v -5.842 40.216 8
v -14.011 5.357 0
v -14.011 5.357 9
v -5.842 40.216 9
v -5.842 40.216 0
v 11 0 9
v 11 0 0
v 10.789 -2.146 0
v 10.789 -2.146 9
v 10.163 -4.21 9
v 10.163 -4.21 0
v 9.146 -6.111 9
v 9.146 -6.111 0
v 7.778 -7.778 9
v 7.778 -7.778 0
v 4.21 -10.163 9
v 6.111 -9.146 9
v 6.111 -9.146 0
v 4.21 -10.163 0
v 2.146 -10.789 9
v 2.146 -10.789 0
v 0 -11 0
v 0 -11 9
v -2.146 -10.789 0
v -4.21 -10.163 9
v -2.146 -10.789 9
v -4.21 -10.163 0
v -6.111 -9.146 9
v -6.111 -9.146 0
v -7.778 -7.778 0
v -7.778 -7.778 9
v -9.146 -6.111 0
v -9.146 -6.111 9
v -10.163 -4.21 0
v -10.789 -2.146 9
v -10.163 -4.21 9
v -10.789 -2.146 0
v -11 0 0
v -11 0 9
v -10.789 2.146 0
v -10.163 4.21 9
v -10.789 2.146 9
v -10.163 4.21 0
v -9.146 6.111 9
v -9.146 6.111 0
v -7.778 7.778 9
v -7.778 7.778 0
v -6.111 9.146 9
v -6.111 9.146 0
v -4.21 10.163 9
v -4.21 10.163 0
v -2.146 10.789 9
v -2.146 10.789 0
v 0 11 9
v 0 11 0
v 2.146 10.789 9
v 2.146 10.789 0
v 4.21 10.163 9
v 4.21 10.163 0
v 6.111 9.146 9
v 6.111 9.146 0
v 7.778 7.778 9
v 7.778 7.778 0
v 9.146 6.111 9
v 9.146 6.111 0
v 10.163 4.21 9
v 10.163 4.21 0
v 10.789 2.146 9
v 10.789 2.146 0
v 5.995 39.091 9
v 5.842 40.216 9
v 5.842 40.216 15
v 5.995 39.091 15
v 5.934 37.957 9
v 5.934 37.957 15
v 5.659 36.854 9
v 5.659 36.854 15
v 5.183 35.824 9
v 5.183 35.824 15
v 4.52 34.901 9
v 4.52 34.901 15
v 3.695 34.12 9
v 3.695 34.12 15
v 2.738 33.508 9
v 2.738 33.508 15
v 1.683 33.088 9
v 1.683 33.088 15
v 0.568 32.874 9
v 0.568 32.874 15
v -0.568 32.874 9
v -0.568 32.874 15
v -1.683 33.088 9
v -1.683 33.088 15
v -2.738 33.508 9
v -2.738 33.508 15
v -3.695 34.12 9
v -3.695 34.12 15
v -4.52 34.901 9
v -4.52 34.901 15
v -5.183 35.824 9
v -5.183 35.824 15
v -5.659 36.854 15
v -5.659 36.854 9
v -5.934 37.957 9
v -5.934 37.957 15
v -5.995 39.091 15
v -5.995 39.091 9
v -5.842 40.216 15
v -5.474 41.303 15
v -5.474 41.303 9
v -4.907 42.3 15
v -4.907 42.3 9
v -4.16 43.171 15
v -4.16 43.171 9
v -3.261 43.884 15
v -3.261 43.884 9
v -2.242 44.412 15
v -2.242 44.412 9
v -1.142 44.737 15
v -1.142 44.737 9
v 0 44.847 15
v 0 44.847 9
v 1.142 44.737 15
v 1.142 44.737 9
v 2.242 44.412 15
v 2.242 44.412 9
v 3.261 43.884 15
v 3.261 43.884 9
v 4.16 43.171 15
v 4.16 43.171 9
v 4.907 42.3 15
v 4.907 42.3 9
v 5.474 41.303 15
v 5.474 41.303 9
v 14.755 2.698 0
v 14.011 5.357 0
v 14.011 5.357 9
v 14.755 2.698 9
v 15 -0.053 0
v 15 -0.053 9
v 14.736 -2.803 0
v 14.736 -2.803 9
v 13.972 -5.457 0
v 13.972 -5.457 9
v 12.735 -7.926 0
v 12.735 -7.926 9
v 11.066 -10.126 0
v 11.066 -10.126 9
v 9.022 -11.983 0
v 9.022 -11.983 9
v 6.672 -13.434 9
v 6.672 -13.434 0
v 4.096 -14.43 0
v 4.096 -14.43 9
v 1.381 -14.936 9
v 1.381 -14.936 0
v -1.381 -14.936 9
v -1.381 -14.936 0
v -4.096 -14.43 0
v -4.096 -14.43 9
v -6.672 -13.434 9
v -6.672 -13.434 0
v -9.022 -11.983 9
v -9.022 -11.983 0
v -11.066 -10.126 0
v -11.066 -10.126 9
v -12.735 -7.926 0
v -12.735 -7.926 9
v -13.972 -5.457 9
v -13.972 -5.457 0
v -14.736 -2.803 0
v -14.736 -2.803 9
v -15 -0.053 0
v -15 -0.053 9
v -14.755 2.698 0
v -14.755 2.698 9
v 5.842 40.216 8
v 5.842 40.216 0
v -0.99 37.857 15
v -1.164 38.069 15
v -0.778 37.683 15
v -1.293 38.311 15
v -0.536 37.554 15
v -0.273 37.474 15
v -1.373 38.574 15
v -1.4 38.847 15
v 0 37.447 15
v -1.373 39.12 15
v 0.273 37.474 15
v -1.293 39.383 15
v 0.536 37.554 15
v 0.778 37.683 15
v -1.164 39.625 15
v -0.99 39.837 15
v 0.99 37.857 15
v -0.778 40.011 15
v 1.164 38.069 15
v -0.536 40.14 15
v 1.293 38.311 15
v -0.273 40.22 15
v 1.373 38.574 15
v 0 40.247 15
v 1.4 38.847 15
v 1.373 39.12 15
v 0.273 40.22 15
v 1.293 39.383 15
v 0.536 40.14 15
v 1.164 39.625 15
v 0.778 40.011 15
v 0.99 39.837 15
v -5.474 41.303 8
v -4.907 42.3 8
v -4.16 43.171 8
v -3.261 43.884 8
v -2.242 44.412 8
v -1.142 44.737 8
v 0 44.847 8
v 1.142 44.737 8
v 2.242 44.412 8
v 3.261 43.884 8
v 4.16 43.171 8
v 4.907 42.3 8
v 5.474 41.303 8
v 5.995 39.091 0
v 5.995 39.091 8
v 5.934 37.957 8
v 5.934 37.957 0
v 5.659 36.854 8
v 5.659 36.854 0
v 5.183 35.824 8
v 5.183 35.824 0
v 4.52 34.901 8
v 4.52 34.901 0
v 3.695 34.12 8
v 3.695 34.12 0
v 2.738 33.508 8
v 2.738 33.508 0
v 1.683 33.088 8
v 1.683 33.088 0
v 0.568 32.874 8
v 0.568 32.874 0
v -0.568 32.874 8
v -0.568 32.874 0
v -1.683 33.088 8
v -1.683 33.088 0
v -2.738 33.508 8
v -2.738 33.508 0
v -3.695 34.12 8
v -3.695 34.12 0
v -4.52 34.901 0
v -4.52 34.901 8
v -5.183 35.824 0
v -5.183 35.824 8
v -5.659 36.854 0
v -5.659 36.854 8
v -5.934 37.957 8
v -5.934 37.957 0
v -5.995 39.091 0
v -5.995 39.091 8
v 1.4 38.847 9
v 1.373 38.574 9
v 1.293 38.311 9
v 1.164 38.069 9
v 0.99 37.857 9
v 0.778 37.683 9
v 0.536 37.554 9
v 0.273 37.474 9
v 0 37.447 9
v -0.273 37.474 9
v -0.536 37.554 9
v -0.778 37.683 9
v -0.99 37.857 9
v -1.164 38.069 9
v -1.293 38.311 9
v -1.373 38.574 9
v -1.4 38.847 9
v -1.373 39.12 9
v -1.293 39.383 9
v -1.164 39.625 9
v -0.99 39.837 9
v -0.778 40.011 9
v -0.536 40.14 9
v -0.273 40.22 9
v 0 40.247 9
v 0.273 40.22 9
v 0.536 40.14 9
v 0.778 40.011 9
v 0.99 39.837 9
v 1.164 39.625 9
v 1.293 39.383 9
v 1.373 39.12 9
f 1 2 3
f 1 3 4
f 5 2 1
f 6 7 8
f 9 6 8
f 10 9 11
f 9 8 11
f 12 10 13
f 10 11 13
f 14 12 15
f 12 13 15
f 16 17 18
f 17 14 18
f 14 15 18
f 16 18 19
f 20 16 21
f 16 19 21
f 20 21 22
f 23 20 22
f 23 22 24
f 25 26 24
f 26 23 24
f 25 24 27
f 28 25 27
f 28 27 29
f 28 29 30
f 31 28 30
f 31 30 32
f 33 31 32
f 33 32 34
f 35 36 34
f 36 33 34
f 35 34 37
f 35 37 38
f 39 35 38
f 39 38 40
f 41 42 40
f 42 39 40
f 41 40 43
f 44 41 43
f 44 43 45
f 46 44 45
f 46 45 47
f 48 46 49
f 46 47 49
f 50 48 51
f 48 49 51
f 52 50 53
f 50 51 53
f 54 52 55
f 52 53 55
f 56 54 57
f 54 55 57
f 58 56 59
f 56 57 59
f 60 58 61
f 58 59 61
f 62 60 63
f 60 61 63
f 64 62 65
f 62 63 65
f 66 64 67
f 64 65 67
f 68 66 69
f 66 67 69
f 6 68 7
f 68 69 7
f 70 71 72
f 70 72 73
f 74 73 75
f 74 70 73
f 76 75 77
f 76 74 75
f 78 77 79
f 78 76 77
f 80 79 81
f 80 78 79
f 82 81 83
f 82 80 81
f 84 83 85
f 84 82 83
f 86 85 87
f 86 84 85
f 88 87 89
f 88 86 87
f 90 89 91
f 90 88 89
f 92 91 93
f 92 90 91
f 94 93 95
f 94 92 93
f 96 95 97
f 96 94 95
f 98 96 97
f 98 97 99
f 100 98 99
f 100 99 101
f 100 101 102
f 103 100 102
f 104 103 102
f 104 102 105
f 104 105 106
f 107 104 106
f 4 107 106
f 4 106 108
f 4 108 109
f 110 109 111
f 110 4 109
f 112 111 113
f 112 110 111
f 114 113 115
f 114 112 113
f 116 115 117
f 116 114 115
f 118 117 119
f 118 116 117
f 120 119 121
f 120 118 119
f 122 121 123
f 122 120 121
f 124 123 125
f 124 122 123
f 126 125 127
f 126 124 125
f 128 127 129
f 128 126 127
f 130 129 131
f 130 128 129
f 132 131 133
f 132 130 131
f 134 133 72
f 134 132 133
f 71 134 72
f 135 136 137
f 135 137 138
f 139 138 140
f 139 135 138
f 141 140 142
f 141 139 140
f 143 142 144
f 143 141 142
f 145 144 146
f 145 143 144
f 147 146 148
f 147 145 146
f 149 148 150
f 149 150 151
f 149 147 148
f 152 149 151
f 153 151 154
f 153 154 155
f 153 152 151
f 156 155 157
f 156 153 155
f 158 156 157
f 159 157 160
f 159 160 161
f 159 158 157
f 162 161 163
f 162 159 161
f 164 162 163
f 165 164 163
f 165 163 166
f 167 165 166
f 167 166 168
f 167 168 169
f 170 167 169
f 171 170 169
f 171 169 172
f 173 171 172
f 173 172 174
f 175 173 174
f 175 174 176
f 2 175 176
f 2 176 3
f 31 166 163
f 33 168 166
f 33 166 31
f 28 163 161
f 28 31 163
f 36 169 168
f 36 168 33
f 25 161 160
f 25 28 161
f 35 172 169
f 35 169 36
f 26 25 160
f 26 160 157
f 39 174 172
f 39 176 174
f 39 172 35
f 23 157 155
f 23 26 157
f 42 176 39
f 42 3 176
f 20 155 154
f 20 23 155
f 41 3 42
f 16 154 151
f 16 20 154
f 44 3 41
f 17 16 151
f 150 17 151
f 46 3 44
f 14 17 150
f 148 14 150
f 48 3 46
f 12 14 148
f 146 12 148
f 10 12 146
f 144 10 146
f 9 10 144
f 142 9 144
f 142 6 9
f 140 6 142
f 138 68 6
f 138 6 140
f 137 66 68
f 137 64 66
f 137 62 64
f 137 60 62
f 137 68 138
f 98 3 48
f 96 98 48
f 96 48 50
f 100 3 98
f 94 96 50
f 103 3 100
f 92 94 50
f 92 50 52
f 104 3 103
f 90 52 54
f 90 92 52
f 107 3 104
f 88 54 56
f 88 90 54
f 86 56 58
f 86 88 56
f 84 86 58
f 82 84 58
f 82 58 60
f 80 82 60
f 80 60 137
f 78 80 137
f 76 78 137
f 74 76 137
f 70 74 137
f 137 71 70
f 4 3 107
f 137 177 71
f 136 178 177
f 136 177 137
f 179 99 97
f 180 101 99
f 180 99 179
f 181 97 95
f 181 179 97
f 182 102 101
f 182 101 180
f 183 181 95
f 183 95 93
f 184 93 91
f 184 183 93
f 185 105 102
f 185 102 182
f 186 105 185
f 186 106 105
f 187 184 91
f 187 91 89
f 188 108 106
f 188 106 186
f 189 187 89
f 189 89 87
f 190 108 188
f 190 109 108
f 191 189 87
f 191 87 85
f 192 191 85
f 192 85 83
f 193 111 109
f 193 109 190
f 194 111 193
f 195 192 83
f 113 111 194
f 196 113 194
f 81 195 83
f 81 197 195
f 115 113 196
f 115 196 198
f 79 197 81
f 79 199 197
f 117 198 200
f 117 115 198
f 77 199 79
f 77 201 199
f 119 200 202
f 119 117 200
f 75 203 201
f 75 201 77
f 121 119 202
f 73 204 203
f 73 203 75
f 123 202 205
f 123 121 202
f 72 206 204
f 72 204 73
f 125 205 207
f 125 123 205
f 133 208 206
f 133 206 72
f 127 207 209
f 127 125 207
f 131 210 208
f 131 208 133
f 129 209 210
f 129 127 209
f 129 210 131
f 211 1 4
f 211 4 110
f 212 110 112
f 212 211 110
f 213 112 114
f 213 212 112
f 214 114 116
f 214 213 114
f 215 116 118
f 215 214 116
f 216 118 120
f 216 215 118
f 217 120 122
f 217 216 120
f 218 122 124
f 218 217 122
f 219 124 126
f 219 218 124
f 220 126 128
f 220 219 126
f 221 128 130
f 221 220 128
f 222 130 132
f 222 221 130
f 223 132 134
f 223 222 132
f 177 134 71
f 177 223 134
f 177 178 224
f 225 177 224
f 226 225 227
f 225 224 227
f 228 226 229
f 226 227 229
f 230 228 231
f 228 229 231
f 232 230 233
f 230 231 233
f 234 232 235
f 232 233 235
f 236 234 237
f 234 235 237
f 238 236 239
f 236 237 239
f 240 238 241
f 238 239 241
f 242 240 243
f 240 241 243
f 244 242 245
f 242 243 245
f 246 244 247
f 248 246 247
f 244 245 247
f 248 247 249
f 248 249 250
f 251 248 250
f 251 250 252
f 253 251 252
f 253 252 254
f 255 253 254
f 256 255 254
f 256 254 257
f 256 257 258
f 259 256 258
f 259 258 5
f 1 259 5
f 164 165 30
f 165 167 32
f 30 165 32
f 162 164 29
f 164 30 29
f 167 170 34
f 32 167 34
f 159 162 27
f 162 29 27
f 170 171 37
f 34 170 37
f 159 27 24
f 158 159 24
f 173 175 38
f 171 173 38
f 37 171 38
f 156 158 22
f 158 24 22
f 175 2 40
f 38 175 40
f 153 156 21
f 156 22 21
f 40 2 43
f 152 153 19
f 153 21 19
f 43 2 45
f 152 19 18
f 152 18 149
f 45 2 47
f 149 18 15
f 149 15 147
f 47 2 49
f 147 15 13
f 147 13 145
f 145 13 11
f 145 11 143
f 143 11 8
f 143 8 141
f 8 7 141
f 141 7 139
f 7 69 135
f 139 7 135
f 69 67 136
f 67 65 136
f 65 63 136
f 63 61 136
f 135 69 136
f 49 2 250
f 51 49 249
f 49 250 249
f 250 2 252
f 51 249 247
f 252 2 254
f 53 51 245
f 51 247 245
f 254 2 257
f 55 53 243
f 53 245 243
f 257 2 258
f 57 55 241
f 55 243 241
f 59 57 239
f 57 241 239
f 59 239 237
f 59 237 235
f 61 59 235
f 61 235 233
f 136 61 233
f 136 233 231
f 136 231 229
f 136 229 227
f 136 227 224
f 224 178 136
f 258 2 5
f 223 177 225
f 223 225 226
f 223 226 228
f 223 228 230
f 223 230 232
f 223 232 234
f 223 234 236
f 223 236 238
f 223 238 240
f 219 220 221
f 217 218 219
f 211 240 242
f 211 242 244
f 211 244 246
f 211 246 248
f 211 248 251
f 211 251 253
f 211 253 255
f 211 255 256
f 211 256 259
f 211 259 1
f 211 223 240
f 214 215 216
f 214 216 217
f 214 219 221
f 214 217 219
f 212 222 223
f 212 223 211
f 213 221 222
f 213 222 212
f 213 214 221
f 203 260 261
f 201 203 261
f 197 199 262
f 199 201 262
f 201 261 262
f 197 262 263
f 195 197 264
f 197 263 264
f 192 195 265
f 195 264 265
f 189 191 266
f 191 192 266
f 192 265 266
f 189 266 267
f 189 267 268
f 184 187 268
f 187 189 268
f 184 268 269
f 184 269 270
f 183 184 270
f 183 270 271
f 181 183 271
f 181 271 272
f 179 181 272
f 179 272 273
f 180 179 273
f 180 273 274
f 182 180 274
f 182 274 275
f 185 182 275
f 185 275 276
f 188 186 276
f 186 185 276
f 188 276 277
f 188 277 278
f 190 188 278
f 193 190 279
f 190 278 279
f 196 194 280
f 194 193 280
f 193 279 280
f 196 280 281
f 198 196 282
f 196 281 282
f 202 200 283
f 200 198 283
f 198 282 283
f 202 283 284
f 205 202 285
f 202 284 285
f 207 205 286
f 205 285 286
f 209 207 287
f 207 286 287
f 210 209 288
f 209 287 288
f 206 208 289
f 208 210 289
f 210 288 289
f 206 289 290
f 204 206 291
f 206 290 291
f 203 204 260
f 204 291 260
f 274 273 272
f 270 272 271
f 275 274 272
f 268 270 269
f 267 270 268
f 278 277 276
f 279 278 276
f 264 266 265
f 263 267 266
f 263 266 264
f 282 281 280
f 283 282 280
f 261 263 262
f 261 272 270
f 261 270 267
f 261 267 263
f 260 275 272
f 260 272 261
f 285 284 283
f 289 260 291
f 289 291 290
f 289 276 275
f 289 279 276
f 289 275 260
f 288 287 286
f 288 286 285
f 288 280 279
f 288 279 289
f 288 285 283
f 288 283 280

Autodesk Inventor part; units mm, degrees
ref_plane "YZ Plane" through (0, 0, 0) normal (1, 0, 0) x (0, 1, 0)
ref_plane "XZ Plane" through (0, 0, 0) normal (0, 1, 0) x (-1, 0, 0)
ref_plane "XY Plane" through (0, 0, 0) normal (0, 0, 1) x (1, 0, 0)
sketch "Sketch1" plane through (0, 0, 0) normal (0, 0, 1) x (1, 0, 0)
  circle A0 centre (0, 0) radius 3.75 projected
  circle A1 centre (0, 0) radius 15 projected
  arc A2 (-0.5916, -14.9883) -> (-0.5916, -14.9883) centre (0, 0) ccw
  circle A3 centre (0, 38.847) radius 6
  circle A4 centre (0, 0) radius 11
  line L0 (5.8417, 40.216) -> (14.0107, 5.3571)
  line L1 (-14.0107, 5.3571) -> (-5.8417, 40.216)
  point P0 (-13.5955, 6.3373)
  point P1 (13.5955, 6.3373)
  point P2 (23.3721, 30.2282)
  dimension "d0" = 30
  dimension "d3" = 12
  dimension "d8" = 22
  dimension "d10" = 38.847
extrude "Extrusion1" add sketch "Sketch1" along normal blind 9 contours A1 | A1 L1 A3 L0 | A3
sketch "Sketch2" plane through (0, 0, 9) normal (0, 0, 1) x (1, 0, 0)
  circle A0 centre (0, 38.847) radius 6
  arc A1 (5.8417, 40.216) -> (-5.8417, 40.216) centre (0, 38.847) ccw projected
  circle A2 centre (0, 38.847) radius 1.4
  point P0 (0, 0)
  dimension "d4" = 12
  dimension "d11" = 2.8
extrude "Extrusion2" add sketch "Sketch2" along normal blind 6
sketch "Sketch3" plane through (0, 0, 0) normal (0, 0, -1) x (-1, 0, 0)
  arc A0 (5.8417, 40.216) -> (-5.8417, 40.216) centre (0, 38.847) ccw projected
  circle A1 centre (0, 38.847) radius 6
  point P0 (0, 0)
  dimension "d12" = 12
extrude "Extrusion3" cut sketch "Sketch3" against normal blind 8
properties part number "ClickSpringBacking"
